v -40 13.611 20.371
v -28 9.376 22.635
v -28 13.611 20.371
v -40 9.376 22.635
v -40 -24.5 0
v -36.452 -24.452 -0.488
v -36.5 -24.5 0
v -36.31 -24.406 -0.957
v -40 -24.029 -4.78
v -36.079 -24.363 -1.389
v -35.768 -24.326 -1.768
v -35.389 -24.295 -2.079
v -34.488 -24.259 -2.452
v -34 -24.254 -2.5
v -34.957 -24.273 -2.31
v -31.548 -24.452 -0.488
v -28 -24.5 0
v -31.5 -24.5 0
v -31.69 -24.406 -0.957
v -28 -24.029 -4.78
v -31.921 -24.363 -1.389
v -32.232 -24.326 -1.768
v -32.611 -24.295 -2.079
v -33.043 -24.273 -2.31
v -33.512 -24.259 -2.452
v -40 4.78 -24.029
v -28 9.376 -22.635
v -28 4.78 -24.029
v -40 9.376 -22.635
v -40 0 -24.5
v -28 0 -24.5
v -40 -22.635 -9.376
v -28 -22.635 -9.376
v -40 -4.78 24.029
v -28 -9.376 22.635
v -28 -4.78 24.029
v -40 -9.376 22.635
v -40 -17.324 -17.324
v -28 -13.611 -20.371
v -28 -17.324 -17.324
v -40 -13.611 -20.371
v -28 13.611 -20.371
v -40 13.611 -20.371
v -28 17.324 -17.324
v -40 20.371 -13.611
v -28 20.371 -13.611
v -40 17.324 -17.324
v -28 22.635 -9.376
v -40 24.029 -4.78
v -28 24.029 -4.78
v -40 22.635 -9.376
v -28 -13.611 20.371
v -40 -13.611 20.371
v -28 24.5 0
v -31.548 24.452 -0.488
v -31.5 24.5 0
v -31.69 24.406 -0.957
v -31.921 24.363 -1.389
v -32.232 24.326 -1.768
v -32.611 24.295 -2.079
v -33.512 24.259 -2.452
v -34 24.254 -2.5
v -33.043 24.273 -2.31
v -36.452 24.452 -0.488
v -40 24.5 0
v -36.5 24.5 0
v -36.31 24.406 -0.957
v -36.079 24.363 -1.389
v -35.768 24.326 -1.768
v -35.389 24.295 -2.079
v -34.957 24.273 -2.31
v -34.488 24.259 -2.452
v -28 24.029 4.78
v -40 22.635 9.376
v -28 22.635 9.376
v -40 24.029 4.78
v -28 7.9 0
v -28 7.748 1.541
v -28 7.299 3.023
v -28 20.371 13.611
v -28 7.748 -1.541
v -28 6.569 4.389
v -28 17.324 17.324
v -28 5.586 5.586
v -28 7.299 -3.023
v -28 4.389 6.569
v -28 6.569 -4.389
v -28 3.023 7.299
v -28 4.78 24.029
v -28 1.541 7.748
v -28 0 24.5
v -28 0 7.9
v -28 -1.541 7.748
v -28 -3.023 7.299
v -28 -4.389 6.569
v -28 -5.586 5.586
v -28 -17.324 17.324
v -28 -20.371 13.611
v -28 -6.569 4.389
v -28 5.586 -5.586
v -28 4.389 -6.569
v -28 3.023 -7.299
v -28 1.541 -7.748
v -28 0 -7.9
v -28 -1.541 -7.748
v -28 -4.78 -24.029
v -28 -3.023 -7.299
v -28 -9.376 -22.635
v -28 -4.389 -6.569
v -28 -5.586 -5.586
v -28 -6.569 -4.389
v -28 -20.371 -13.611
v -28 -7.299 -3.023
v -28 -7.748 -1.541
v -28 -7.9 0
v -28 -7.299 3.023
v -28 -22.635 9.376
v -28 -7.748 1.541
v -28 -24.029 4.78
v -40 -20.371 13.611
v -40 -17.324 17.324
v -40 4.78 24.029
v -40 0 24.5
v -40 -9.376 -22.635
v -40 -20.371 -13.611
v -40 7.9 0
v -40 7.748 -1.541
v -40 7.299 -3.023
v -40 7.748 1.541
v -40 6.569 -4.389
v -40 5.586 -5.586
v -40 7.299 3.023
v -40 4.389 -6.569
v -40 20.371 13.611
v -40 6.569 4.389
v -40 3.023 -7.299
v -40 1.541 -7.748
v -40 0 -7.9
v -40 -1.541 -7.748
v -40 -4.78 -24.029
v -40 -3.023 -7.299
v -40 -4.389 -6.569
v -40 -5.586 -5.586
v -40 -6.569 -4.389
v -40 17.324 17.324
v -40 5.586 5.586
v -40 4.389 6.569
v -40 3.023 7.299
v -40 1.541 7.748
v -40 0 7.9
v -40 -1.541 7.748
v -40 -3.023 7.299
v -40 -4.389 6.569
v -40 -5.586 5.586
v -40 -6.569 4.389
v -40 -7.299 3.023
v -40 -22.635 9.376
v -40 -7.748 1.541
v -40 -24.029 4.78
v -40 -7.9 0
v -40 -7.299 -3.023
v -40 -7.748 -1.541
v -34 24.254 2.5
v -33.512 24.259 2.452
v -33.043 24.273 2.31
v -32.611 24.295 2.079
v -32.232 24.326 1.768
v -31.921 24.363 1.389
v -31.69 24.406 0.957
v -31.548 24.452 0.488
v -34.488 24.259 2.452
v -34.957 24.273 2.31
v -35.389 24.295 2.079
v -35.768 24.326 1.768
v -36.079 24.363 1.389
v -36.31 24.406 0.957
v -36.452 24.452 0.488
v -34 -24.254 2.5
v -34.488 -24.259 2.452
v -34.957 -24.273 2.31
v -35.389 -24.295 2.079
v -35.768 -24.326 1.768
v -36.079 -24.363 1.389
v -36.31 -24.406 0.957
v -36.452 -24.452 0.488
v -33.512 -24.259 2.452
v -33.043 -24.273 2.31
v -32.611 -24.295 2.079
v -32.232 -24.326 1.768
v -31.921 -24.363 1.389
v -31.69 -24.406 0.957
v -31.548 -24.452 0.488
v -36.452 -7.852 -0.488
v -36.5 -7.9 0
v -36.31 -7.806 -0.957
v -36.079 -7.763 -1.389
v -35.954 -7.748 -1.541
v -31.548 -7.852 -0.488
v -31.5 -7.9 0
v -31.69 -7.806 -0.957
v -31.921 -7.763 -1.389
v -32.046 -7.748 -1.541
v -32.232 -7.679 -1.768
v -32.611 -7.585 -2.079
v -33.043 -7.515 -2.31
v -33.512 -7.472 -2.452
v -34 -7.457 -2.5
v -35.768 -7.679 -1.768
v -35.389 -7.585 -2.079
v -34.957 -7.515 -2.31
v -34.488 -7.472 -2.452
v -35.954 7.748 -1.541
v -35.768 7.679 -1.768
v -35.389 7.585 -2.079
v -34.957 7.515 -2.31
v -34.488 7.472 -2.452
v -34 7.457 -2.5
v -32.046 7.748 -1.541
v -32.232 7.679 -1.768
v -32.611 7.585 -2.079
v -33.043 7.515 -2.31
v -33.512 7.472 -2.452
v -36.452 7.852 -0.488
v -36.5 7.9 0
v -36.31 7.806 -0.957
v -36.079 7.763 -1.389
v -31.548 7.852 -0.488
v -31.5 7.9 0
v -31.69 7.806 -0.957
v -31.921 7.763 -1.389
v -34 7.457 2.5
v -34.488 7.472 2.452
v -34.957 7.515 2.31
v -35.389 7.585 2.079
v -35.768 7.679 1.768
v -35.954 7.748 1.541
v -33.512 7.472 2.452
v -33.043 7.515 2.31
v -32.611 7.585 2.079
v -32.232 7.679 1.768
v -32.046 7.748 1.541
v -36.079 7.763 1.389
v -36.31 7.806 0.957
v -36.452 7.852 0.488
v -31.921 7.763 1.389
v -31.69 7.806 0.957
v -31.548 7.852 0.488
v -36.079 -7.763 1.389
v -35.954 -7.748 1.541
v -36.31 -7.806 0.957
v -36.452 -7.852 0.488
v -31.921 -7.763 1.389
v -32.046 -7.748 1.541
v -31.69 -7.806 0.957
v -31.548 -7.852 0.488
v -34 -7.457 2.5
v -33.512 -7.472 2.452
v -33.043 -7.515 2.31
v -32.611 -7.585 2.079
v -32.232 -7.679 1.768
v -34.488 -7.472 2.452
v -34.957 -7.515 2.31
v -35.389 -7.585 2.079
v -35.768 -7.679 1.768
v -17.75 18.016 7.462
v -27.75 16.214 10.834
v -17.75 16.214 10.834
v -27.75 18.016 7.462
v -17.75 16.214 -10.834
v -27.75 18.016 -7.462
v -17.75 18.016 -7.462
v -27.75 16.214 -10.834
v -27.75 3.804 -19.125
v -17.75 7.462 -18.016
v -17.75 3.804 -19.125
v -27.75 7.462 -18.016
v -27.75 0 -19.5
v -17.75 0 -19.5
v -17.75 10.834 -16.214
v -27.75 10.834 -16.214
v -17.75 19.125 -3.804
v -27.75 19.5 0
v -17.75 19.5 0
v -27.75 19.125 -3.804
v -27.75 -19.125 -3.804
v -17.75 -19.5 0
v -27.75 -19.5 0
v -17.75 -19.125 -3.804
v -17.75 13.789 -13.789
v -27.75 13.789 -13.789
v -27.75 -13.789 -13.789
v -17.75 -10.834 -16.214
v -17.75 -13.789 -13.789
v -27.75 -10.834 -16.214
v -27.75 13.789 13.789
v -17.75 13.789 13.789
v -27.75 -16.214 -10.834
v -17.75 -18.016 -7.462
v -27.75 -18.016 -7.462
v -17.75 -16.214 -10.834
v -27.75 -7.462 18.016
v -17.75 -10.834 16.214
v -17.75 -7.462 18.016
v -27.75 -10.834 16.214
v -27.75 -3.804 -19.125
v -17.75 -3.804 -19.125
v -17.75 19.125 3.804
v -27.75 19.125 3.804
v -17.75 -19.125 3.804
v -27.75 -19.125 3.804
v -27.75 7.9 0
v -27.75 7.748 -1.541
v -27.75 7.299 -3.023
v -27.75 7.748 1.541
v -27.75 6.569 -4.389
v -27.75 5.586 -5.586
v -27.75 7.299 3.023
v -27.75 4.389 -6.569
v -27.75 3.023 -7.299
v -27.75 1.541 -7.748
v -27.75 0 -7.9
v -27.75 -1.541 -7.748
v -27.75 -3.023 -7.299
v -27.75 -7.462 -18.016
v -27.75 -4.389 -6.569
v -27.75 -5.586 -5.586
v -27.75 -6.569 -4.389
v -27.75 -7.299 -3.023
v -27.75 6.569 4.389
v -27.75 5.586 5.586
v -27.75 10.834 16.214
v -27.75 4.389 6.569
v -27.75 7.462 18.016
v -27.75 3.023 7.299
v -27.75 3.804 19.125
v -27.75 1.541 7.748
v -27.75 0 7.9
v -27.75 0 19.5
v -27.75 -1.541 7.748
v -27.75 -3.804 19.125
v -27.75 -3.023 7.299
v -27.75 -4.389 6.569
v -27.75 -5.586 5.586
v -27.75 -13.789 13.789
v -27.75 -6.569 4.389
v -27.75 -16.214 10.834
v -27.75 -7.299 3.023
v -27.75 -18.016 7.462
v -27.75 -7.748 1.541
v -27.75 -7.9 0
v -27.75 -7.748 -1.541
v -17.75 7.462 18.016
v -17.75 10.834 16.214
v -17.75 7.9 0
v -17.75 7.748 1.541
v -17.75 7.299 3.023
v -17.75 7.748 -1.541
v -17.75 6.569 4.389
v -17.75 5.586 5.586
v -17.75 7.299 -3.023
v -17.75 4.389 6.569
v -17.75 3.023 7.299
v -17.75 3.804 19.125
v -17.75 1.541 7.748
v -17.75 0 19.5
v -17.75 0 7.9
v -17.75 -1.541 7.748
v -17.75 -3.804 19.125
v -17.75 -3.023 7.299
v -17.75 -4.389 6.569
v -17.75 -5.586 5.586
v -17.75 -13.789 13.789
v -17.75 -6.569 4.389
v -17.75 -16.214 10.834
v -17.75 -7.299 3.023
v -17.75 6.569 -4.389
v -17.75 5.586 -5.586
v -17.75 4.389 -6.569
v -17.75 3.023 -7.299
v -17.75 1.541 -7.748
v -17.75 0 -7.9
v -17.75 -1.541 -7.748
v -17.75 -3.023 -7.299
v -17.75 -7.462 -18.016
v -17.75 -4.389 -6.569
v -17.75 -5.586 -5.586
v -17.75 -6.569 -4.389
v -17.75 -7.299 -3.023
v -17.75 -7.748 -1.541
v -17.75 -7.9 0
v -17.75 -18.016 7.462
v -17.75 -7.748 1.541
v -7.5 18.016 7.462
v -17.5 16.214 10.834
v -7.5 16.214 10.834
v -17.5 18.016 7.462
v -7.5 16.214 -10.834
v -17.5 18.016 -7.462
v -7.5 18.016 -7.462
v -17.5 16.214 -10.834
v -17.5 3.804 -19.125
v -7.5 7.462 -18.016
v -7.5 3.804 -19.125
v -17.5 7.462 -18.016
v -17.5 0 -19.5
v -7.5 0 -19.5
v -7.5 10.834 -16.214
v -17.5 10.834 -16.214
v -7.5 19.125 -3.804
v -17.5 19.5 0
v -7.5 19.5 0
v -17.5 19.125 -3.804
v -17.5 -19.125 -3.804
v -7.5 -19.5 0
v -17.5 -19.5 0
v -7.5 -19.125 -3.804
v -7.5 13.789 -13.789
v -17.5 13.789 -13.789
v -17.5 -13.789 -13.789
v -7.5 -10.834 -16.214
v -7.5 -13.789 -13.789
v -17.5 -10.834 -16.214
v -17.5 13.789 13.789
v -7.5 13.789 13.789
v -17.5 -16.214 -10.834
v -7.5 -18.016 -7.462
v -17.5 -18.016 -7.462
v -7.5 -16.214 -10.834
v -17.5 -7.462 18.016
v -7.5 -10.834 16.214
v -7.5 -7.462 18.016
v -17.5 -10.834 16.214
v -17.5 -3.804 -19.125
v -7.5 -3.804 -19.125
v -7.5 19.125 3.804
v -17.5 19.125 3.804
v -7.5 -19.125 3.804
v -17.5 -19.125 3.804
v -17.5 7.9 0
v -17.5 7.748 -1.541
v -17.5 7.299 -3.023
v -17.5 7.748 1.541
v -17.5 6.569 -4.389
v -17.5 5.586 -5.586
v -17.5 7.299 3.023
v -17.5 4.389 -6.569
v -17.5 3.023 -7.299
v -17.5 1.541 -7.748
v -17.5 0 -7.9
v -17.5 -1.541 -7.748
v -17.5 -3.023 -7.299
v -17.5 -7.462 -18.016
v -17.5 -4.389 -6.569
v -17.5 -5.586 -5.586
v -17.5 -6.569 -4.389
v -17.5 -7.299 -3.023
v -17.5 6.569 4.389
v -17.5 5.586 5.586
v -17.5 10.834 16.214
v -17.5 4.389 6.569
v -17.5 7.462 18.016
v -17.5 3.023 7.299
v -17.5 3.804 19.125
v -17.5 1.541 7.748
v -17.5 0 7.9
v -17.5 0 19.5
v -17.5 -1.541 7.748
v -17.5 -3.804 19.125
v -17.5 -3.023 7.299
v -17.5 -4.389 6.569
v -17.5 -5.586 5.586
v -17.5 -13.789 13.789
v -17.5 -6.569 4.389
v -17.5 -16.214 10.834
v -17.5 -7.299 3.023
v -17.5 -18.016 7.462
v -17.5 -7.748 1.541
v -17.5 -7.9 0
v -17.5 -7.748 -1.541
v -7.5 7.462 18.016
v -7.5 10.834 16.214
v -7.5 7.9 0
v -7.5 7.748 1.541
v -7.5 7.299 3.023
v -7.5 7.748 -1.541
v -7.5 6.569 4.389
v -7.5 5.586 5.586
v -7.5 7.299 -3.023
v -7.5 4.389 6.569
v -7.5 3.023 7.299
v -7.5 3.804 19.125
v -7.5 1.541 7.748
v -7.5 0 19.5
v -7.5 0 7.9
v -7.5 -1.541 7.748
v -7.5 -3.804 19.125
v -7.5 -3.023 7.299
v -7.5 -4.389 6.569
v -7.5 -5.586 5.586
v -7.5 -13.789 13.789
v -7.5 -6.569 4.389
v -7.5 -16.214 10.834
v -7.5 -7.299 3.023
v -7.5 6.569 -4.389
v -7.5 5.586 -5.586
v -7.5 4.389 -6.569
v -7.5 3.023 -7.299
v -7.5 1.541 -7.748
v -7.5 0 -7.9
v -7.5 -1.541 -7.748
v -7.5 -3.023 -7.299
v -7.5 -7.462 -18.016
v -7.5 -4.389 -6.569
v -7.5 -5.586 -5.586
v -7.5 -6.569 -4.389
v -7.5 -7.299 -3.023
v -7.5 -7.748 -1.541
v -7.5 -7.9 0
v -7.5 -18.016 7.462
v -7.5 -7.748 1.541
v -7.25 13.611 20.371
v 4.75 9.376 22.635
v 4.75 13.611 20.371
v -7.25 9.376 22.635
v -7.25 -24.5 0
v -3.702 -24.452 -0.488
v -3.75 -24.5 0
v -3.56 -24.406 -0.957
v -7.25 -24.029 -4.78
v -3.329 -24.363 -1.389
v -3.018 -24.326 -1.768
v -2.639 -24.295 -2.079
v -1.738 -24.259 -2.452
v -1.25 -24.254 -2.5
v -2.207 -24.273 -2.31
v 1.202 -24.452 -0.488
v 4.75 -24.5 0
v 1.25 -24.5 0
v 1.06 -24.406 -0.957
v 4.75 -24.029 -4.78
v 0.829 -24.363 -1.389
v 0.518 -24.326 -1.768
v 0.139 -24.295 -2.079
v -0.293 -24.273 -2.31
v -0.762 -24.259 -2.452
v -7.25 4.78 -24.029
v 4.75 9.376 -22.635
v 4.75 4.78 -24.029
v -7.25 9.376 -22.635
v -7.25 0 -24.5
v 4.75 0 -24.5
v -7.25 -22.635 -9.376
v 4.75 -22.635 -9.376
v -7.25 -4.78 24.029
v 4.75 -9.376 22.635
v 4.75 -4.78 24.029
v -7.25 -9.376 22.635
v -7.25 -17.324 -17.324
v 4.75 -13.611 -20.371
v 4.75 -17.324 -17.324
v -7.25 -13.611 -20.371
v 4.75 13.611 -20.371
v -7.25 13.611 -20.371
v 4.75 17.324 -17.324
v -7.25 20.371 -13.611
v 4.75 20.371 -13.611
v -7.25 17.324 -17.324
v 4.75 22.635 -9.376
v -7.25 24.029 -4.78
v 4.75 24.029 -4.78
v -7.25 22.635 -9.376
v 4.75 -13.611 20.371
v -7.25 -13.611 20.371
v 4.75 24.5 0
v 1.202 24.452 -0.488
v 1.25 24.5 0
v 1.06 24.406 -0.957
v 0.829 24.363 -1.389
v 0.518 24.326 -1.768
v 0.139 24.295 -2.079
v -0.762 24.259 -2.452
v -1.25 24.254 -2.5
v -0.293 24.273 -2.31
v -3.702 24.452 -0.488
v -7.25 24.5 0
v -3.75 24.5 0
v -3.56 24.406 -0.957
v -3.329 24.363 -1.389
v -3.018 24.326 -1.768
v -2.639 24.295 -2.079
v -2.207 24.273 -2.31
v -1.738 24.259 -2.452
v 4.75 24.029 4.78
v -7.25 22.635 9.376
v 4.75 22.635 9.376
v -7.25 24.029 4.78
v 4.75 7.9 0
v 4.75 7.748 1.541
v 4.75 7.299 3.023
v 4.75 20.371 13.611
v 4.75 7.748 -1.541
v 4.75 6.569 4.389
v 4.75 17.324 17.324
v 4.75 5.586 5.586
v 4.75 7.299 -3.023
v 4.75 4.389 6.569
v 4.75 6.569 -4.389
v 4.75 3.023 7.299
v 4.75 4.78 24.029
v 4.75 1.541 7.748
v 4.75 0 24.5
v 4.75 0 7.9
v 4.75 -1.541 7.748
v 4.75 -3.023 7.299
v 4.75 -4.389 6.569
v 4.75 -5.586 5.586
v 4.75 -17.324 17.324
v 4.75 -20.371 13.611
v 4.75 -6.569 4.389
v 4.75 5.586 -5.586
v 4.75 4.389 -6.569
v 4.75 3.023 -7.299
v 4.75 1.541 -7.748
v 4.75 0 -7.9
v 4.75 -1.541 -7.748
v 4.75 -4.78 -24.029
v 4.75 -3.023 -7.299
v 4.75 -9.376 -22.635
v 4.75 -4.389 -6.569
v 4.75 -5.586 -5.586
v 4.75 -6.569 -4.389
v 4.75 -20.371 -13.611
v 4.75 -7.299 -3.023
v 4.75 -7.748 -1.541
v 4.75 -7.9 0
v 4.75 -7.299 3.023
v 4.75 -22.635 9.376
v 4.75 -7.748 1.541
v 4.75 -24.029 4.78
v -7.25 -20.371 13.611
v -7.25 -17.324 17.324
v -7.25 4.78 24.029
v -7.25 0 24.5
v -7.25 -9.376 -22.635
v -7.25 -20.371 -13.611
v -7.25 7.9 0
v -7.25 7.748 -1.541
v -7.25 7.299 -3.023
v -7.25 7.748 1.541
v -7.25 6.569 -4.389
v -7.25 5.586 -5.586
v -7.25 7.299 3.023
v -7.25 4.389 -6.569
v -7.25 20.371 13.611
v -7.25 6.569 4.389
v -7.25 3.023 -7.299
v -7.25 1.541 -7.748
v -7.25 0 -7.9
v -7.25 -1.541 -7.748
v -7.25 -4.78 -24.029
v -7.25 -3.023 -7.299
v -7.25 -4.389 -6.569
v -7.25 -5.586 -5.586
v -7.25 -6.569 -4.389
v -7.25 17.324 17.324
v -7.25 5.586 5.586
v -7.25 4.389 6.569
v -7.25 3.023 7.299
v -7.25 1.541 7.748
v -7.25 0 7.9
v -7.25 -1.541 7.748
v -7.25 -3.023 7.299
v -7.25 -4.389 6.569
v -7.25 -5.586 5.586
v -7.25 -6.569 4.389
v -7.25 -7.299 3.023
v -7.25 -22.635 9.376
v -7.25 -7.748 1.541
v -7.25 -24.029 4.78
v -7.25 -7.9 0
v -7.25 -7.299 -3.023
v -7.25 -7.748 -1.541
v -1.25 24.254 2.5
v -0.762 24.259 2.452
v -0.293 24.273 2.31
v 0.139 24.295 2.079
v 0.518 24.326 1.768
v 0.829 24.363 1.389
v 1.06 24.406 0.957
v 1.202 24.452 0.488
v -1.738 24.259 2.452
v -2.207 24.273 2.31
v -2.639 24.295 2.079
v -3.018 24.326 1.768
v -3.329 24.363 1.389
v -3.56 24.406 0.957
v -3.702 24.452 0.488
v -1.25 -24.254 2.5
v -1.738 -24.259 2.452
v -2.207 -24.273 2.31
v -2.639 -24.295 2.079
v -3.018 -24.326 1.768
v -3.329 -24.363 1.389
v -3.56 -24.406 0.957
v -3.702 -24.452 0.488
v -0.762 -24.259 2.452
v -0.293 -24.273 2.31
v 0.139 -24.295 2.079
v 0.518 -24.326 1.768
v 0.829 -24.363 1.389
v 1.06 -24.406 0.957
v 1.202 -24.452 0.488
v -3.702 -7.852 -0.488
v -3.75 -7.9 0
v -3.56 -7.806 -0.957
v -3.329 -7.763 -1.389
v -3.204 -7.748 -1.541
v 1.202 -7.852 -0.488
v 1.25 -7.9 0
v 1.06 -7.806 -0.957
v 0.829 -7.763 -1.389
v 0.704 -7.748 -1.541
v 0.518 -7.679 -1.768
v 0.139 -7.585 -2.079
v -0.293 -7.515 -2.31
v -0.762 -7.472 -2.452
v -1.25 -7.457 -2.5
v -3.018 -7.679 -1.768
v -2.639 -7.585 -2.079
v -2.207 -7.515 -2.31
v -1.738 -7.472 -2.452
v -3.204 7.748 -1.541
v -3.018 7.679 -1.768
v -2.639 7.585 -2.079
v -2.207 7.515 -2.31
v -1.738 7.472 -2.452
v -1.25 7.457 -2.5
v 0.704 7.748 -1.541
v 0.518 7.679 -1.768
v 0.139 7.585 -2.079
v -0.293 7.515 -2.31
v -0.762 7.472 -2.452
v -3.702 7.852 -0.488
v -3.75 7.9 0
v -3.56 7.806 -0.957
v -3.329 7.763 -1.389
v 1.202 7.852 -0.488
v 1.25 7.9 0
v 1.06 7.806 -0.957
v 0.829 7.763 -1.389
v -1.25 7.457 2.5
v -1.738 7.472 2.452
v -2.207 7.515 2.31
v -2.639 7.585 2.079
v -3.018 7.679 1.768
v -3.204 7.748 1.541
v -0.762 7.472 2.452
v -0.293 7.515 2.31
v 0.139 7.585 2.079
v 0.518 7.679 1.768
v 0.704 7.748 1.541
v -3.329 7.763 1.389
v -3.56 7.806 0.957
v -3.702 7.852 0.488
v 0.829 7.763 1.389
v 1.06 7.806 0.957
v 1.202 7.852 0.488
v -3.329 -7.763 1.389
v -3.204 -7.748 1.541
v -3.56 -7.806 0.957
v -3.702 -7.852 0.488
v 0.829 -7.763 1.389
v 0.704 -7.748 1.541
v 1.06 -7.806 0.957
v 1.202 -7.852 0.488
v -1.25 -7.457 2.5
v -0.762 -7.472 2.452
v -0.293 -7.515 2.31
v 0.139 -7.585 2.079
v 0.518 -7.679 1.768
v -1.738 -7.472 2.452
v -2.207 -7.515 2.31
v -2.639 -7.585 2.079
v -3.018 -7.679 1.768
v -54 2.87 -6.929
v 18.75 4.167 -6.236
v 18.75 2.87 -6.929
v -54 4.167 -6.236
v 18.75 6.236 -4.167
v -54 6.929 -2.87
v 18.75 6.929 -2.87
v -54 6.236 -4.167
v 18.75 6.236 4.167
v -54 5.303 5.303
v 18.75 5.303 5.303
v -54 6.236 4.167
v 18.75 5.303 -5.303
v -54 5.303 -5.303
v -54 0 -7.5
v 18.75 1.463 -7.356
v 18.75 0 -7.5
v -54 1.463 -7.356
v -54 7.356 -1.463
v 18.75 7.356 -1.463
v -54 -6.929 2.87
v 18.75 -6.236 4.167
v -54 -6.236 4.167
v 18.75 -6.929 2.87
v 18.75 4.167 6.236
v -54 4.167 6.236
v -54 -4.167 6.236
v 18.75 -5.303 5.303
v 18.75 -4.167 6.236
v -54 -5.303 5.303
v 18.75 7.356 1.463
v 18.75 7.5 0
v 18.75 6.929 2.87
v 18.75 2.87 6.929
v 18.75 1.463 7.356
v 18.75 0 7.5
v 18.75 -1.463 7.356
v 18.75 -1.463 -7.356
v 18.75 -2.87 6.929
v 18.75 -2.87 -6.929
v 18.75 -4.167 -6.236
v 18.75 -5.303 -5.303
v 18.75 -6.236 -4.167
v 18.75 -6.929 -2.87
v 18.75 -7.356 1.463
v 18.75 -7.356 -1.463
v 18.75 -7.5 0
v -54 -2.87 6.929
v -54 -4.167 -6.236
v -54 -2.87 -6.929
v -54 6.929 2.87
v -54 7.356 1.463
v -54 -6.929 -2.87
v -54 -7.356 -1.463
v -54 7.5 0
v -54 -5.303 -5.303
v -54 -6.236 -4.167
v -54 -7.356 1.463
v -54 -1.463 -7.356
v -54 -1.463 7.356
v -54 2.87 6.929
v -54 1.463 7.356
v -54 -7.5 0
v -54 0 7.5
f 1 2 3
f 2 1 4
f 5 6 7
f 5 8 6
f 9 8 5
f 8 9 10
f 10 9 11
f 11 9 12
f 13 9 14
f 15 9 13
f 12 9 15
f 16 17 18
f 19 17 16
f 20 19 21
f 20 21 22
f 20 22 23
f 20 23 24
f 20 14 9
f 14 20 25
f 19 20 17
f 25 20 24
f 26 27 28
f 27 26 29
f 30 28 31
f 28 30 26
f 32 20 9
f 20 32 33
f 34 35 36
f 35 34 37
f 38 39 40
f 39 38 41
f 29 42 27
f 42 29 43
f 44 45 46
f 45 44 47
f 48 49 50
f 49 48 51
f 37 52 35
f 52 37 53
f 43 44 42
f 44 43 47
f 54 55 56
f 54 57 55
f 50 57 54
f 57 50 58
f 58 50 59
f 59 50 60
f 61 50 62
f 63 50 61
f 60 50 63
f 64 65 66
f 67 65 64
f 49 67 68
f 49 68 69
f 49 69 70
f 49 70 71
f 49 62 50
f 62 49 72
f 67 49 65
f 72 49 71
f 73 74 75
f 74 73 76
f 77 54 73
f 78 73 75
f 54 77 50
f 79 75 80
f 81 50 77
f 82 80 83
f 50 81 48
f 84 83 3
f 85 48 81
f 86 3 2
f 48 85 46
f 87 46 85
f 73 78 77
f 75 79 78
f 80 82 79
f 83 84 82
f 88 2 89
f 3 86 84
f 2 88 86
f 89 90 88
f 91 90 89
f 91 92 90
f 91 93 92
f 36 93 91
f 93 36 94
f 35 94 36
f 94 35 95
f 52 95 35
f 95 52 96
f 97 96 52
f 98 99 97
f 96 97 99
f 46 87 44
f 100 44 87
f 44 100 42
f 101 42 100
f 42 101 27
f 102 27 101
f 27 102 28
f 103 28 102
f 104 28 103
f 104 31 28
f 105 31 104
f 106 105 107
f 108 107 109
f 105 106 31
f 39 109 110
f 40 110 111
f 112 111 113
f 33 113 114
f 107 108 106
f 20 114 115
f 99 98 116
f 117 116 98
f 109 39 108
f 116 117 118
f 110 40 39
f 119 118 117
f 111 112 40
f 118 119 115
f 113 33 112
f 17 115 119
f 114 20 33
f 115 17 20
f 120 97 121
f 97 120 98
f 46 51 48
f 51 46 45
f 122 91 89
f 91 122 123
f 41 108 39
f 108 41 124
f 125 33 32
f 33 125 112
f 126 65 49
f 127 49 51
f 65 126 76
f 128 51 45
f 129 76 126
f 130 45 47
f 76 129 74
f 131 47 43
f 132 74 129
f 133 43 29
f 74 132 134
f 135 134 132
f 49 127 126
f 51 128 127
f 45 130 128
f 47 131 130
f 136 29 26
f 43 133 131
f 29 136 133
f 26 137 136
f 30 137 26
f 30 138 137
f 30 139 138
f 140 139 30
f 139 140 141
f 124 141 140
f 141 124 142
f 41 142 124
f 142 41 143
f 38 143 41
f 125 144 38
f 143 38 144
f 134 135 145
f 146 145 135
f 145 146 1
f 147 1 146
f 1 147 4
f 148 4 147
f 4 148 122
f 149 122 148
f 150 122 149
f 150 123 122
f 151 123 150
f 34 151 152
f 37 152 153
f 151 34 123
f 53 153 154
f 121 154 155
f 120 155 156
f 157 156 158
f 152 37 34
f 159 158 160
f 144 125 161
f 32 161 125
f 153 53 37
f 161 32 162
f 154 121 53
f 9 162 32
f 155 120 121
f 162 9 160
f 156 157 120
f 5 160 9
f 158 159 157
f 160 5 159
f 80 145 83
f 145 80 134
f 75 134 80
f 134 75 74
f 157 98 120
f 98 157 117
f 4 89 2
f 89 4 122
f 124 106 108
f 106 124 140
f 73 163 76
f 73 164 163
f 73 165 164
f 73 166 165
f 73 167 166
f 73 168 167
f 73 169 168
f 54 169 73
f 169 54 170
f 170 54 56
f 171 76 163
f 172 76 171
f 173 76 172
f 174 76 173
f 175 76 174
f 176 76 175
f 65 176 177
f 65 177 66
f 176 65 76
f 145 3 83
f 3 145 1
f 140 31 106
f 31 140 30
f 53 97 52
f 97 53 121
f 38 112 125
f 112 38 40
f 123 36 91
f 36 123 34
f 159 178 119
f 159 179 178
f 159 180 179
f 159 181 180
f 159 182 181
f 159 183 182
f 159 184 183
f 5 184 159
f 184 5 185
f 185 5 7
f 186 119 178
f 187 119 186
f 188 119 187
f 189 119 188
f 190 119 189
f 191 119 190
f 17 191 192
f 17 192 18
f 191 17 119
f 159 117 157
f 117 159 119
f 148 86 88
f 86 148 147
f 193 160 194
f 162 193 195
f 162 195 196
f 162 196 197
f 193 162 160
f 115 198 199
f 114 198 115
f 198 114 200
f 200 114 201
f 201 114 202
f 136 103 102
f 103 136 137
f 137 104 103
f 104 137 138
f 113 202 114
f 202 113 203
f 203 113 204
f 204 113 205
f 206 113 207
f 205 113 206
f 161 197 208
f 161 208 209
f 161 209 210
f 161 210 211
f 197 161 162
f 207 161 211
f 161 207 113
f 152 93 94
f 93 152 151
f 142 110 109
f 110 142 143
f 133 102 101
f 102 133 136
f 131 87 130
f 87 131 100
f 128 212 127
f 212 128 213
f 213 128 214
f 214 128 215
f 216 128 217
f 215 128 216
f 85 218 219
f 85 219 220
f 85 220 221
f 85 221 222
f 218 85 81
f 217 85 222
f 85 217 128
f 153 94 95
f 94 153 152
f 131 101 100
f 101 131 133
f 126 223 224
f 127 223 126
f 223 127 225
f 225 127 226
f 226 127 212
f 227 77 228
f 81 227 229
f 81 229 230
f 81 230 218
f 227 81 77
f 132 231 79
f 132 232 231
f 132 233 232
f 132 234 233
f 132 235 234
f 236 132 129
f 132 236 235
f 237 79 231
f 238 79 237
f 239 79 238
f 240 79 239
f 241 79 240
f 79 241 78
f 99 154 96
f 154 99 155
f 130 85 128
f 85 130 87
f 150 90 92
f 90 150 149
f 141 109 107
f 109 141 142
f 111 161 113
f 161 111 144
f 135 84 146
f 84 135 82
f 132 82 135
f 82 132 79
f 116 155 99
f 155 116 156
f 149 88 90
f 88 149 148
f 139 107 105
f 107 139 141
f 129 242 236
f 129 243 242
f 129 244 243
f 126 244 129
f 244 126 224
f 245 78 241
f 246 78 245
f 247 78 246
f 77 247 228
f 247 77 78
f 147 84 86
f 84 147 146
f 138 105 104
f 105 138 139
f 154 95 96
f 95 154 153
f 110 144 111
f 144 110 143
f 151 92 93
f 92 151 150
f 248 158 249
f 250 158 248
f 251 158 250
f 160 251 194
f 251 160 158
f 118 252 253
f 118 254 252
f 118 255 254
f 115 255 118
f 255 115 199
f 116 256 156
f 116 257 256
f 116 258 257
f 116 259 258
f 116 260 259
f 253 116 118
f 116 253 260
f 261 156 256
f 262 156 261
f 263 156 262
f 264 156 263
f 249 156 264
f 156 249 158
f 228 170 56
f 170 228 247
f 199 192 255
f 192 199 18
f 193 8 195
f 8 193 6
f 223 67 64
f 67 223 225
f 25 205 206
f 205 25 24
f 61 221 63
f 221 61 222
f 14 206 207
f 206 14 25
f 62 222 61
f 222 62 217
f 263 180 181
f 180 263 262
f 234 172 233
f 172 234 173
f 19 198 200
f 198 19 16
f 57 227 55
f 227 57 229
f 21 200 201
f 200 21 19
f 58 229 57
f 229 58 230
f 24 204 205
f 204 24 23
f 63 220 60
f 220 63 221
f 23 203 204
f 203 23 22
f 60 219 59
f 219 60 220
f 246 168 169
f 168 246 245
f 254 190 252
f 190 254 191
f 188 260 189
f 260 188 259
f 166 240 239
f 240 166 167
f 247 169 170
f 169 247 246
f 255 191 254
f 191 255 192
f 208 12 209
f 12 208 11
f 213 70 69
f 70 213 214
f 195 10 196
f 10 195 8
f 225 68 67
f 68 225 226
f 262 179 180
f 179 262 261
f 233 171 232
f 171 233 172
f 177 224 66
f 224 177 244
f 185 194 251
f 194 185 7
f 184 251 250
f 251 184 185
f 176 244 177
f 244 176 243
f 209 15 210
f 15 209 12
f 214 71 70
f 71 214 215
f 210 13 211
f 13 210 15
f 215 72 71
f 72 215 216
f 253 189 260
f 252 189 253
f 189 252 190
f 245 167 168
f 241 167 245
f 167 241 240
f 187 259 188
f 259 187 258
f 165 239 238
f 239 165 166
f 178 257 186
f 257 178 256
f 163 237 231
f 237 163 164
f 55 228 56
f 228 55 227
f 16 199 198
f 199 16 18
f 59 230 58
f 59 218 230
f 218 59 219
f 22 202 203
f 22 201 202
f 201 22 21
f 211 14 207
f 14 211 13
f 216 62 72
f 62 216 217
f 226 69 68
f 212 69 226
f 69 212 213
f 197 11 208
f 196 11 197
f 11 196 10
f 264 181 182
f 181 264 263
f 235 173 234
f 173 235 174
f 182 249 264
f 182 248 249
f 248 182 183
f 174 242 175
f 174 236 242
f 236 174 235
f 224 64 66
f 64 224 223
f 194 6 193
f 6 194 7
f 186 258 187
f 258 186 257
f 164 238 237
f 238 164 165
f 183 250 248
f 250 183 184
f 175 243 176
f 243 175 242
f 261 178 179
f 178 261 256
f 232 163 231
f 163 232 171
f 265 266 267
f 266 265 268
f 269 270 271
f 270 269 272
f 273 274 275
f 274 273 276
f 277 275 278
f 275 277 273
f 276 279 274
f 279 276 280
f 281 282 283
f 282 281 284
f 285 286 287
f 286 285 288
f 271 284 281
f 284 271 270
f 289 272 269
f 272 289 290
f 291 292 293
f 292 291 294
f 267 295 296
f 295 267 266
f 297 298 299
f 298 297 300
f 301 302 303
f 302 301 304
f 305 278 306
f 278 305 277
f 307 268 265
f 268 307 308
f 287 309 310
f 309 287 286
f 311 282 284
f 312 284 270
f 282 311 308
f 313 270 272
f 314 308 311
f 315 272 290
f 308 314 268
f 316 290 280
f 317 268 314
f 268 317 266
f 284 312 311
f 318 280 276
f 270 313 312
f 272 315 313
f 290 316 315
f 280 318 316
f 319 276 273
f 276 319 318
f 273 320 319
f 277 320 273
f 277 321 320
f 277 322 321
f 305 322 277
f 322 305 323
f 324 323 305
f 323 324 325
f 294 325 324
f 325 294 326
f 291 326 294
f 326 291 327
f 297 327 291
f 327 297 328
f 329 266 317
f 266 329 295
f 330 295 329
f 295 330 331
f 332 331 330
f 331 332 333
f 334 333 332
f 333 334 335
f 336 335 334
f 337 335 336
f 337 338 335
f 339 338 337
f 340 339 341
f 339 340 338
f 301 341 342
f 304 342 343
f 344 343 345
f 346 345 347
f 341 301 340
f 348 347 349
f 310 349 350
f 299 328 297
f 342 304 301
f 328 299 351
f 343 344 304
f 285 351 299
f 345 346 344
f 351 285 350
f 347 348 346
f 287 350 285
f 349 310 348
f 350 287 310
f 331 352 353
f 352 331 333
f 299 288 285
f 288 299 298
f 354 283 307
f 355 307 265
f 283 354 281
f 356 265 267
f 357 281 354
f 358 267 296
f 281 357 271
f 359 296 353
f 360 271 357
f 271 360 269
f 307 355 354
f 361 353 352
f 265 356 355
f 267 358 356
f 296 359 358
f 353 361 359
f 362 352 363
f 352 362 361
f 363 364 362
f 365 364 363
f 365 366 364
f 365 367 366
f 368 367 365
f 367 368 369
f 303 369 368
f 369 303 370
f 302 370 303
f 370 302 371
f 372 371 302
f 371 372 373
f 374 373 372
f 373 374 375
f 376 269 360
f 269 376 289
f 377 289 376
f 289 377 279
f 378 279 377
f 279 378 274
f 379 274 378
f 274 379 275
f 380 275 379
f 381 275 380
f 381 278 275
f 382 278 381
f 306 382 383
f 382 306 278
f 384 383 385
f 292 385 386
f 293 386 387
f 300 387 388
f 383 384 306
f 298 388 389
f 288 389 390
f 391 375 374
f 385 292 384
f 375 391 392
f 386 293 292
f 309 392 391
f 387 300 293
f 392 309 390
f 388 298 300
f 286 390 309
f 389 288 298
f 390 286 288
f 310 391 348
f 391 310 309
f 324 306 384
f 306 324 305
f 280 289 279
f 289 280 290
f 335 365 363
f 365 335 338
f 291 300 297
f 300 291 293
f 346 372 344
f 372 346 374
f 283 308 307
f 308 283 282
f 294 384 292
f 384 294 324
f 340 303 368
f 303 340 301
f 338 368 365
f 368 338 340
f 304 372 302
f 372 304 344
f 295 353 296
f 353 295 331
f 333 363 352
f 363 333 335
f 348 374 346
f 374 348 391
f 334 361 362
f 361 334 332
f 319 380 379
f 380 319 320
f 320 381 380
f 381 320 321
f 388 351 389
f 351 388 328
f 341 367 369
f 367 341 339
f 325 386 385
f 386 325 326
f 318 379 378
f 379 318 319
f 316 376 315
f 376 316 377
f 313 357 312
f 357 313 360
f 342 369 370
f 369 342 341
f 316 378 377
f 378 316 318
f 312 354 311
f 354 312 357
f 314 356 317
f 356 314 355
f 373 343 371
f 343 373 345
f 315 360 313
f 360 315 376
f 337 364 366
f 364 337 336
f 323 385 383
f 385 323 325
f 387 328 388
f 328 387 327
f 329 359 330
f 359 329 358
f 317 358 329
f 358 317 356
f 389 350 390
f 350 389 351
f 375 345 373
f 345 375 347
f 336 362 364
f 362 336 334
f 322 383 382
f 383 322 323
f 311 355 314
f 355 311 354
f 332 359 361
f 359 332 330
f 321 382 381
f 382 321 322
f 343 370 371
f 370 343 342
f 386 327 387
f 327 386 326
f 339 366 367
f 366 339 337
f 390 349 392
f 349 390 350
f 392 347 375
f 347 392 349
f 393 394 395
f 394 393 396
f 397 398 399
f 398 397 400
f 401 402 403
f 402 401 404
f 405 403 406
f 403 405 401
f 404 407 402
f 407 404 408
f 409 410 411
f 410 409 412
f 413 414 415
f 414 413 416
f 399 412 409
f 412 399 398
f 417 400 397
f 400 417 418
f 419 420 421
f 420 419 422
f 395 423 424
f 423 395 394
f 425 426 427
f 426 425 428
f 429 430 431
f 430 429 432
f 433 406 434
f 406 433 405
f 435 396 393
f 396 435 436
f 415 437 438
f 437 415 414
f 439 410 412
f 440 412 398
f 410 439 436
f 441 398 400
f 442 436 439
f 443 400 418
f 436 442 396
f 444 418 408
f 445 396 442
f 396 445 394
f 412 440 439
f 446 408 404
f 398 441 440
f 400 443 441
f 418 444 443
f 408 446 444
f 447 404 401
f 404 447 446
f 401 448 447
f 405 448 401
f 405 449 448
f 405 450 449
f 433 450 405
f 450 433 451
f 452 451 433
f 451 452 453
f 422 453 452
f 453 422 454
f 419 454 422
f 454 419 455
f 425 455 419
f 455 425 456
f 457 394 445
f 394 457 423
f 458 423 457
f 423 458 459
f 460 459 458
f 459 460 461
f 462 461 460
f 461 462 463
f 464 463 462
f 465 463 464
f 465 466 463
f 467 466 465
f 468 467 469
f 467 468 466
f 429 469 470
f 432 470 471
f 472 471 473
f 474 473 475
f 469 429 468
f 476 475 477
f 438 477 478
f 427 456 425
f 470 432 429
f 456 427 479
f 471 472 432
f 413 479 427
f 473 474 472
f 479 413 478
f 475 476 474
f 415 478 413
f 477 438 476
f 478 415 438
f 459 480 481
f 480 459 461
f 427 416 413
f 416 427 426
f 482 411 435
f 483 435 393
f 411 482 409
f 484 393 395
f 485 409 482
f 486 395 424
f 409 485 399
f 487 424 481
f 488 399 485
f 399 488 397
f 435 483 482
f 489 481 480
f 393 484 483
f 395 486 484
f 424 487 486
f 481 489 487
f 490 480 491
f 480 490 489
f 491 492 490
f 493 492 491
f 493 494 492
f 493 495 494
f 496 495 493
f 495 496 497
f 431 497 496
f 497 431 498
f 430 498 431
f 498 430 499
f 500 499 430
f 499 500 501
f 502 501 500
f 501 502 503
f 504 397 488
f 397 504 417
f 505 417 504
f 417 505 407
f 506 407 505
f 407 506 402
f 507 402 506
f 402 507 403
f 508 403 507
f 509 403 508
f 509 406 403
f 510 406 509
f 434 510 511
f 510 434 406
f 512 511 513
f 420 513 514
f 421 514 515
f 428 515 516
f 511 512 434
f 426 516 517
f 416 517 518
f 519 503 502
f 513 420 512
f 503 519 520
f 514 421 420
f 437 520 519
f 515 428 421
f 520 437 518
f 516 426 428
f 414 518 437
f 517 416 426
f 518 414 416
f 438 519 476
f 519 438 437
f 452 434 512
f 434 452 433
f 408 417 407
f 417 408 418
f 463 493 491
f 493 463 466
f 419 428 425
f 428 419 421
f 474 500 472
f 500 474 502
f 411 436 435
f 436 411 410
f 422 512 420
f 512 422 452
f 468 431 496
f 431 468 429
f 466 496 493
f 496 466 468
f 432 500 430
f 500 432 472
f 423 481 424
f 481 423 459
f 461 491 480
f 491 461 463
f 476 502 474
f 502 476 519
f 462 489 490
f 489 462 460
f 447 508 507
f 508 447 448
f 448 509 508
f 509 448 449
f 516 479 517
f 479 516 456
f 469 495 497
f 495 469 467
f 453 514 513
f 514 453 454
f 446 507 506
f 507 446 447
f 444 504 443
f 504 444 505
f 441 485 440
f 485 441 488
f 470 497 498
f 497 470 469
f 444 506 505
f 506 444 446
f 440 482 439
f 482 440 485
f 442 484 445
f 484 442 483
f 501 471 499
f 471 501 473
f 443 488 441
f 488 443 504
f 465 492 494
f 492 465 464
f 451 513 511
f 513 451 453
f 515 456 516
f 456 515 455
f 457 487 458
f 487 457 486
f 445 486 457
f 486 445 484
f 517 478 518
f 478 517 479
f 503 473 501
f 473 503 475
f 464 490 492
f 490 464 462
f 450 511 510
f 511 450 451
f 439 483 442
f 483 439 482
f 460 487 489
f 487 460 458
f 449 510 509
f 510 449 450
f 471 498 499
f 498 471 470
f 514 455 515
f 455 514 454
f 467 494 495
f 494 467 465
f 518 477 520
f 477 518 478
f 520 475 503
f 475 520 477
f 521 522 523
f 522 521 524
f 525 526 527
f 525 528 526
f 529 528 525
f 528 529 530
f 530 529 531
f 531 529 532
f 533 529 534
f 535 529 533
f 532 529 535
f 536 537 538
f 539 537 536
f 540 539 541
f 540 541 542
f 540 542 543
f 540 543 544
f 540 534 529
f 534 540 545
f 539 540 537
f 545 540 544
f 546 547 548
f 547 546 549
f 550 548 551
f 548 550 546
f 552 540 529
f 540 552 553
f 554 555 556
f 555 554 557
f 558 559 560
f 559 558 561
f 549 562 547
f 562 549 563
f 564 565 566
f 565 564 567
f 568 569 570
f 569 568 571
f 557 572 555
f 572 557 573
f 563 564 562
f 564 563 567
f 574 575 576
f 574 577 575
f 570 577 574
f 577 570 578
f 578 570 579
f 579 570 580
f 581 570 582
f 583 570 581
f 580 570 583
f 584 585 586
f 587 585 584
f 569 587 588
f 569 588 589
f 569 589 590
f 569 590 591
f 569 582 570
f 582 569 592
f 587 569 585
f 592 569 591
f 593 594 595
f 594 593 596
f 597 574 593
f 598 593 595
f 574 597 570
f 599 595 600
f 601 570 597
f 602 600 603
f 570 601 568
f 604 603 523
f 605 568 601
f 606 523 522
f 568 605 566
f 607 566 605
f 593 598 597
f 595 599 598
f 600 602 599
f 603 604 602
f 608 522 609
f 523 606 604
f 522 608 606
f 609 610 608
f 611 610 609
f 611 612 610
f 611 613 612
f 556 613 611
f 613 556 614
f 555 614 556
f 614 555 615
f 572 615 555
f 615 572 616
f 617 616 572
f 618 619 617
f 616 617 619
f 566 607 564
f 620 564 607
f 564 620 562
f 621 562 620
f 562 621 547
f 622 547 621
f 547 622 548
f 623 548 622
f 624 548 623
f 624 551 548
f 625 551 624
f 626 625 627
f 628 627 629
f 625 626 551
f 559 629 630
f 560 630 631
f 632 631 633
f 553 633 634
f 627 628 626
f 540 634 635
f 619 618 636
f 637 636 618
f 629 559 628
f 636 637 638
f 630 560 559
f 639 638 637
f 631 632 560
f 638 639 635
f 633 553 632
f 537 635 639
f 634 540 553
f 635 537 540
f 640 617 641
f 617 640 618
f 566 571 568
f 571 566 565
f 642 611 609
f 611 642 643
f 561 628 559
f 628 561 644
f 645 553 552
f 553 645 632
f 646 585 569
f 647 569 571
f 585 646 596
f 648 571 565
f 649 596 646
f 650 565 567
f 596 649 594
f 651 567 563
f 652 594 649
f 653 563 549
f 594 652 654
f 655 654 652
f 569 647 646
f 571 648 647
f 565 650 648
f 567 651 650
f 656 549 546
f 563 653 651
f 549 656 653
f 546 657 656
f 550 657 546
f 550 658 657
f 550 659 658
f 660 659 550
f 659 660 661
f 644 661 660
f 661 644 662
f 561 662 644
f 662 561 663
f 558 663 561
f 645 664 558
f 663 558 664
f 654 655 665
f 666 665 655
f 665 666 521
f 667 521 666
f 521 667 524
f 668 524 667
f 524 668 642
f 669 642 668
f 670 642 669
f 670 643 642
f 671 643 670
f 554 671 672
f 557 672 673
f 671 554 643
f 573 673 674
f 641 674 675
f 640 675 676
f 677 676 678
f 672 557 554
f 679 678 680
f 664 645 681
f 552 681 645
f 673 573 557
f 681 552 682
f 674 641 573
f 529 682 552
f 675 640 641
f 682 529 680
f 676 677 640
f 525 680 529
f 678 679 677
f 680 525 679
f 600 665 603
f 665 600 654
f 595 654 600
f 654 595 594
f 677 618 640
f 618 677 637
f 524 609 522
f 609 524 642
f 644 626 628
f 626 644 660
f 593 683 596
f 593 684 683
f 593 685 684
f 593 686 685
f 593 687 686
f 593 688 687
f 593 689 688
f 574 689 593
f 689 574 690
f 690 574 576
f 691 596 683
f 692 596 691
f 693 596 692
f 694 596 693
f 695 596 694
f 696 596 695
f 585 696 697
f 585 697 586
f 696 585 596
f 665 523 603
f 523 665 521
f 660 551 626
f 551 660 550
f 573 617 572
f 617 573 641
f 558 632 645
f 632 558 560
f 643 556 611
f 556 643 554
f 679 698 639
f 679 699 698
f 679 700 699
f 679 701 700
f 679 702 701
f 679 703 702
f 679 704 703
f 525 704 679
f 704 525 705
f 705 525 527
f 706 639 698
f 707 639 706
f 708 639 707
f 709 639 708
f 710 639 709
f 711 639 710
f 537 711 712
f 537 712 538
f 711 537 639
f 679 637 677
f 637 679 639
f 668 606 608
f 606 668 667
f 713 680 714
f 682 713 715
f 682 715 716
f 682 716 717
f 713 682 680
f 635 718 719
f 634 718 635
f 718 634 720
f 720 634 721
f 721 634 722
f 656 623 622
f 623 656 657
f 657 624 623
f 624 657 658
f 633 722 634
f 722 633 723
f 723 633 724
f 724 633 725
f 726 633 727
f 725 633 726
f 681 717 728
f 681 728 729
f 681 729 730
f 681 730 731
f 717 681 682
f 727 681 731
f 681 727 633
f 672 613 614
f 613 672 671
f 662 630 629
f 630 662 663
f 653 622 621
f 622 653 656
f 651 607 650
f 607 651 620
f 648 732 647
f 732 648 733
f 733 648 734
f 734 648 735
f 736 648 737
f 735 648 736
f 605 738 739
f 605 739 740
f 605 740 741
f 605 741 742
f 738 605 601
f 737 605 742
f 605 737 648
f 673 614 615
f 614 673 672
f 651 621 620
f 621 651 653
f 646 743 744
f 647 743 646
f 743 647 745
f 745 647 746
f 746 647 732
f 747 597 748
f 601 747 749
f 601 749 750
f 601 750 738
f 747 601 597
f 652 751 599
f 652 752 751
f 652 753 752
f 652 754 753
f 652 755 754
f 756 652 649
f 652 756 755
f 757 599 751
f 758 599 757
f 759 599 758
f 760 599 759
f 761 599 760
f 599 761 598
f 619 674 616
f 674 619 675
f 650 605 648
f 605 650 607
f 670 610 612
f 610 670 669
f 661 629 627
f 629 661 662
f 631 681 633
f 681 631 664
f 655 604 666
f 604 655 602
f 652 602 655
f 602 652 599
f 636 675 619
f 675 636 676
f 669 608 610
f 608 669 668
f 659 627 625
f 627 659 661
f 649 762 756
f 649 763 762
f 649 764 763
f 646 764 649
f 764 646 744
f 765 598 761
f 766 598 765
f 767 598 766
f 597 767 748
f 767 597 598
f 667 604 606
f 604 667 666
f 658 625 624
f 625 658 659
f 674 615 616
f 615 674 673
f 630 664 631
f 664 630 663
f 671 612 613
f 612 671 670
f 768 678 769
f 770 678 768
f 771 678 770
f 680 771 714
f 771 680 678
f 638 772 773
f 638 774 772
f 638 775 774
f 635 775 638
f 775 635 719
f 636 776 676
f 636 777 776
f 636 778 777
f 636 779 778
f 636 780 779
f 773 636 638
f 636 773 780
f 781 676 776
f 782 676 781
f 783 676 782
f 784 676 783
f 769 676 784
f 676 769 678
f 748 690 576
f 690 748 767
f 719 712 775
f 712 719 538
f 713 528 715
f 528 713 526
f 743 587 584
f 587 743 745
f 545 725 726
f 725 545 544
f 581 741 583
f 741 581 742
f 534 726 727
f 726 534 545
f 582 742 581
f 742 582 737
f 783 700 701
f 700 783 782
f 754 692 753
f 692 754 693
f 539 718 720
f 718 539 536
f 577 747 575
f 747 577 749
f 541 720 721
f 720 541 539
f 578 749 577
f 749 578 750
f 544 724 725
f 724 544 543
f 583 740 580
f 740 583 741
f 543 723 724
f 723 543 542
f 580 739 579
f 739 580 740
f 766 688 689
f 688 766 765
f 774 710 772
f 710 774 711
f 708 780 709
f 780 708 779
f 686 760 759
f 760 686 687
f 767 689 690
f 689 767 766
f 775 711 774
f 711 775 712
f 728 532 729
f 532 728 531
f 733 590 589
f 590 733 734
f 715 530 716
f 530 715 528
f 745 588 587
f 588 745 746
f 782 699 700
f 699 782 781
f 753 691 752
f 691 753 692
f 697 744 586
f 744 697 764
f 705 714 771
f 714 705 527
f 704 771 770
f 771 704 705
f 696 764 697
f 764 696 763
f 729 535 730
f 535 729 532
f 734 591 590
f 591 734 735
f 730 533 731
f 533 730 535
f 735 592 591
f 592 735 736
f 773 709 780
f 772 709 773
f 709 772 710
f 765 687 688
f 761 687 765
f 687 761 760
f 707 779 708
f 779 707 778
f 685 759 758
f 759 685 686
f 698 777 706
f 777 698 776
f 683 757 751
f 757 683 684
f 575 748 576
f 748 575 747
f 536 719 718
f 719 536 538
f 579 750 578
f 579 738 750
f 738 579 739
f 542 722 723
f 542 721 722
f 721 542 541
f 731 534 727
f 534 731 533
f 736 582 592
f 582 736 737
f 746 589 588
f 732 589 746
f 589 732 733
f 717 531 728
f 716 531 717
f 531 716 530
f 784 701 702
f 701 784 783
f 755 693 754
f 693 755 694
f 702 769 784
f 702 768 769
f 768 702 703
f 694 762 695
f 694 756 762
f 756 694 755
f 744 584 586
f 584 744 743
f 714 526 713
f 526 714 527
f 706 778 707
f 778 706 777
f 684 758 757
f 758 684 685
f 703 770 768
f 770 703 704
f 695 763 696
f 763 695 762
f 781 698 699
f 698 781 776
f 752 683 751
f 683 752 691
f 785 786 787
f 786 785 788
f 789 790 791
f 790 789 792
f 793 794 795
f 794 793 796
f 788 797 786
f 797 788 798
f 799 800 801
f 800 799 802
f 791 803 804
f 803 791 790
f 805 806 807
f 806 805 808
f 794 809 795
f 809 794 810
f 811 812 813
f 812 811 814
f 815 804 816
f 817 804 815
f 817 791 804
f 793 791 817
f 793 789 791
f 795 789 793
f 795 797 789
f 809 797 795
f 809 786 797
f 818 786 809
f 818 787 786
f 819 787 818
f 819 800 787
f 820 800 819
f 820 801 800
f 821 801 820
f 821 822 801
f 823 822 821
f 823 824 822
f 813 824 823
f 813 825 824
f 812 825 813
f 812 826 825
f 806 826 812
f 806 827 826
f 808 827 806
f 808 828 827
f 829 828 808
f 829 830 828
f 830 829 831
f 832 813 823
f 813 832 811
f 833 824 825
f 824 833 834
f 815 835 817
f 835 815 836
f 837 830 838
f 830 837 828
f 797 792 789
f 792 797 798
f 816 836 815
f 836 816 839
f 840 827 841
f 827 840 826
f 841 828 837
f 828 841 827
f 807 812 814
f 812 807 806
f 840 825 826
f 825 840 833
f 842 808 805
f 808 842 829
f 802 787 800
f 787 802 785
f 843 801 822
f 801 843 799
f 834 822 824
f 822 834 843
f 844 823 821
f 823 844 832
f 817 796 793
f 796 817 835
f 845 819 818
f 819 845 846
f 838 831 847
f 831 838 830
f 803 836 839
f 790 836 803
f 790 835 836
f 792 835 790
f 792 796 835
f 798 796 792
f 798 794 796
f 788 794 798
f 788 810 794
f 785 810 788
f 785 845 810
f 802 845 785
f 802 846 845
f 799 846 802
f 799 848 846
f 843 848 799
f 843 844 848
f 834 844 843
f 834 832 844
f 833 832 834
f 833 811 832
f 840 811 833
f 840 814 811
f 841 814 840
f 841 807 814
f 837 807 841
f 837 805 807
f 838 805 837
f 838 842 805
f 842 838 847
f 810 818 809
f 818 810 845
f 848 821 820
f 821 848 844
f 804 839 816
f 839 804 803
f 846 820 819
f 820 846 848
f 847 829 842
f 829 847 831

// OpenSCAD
$fn = 32;

// ------------------------------------------------------------------------
// Shaft with rings and collars: d15 shaft, 4 rings
// Every part is its own module, assembly() places them once.
// ------------------------------------------------------------------------

// --- part 1 ---
module shaft() {
  translate([0, 0, -36.375]) cylinder(h = 72.75, d = 15);
}

// --- part 2 ---
module collar_a() {
  difference() {
    cylinder(h = 12, d = 49);
    translate([0, 0, -1]) cylinder(h = 14, d = 15.8);
    translate([0, 0, 6]) rotate([90, 0, 0]) cylinder(h = 51, d = 5, center = true);
  }
}

// --- part 3 ---
module spacer_a() {
  difference() {
      translate([0, 0, 0]) cylinder(h = 10, d = 39);
      translate([0, 0, -1]) cylinder(h = 12, d = 15.8);
    }
}

// --- part 4 ---
module spacer_b() {
  difference() {
      translate([0, 0, 0]) cylinder(h = 10, d = 39);
      translate([0, 0, -1]) cylinder(h = 12, d = 15.8);
    }
}

// --- part 5 ---
module collar_b() {
  difference() {
    cylinder(h = 12, d = 49);
    translate([0, 0, -1]) cylinder(h = 14, d = 15.8);
    translate([0, 0, 6]) rotate([90, 0, 0]) cylinder(h = 51, d = 5, center = true);
  }
}

// --- assembly ---
module assembly() {
  translate([-17.625, 0, 0]) rotate([0, 90, 0]) shaft();
  translate([-40, 0, 0]) rotate([0, 90, 0]) collar_a();
  translate([-27.75, 0, 0]) rotate([0, 90, 0]) spacer_a();
  translate([-17.5, 0, 0]) rotate([0, 90, 0]) spacer_b();
  translate([-7.25, 0, 0]) rotate([0, 90, 0]) collar_b();
}

assembly();
